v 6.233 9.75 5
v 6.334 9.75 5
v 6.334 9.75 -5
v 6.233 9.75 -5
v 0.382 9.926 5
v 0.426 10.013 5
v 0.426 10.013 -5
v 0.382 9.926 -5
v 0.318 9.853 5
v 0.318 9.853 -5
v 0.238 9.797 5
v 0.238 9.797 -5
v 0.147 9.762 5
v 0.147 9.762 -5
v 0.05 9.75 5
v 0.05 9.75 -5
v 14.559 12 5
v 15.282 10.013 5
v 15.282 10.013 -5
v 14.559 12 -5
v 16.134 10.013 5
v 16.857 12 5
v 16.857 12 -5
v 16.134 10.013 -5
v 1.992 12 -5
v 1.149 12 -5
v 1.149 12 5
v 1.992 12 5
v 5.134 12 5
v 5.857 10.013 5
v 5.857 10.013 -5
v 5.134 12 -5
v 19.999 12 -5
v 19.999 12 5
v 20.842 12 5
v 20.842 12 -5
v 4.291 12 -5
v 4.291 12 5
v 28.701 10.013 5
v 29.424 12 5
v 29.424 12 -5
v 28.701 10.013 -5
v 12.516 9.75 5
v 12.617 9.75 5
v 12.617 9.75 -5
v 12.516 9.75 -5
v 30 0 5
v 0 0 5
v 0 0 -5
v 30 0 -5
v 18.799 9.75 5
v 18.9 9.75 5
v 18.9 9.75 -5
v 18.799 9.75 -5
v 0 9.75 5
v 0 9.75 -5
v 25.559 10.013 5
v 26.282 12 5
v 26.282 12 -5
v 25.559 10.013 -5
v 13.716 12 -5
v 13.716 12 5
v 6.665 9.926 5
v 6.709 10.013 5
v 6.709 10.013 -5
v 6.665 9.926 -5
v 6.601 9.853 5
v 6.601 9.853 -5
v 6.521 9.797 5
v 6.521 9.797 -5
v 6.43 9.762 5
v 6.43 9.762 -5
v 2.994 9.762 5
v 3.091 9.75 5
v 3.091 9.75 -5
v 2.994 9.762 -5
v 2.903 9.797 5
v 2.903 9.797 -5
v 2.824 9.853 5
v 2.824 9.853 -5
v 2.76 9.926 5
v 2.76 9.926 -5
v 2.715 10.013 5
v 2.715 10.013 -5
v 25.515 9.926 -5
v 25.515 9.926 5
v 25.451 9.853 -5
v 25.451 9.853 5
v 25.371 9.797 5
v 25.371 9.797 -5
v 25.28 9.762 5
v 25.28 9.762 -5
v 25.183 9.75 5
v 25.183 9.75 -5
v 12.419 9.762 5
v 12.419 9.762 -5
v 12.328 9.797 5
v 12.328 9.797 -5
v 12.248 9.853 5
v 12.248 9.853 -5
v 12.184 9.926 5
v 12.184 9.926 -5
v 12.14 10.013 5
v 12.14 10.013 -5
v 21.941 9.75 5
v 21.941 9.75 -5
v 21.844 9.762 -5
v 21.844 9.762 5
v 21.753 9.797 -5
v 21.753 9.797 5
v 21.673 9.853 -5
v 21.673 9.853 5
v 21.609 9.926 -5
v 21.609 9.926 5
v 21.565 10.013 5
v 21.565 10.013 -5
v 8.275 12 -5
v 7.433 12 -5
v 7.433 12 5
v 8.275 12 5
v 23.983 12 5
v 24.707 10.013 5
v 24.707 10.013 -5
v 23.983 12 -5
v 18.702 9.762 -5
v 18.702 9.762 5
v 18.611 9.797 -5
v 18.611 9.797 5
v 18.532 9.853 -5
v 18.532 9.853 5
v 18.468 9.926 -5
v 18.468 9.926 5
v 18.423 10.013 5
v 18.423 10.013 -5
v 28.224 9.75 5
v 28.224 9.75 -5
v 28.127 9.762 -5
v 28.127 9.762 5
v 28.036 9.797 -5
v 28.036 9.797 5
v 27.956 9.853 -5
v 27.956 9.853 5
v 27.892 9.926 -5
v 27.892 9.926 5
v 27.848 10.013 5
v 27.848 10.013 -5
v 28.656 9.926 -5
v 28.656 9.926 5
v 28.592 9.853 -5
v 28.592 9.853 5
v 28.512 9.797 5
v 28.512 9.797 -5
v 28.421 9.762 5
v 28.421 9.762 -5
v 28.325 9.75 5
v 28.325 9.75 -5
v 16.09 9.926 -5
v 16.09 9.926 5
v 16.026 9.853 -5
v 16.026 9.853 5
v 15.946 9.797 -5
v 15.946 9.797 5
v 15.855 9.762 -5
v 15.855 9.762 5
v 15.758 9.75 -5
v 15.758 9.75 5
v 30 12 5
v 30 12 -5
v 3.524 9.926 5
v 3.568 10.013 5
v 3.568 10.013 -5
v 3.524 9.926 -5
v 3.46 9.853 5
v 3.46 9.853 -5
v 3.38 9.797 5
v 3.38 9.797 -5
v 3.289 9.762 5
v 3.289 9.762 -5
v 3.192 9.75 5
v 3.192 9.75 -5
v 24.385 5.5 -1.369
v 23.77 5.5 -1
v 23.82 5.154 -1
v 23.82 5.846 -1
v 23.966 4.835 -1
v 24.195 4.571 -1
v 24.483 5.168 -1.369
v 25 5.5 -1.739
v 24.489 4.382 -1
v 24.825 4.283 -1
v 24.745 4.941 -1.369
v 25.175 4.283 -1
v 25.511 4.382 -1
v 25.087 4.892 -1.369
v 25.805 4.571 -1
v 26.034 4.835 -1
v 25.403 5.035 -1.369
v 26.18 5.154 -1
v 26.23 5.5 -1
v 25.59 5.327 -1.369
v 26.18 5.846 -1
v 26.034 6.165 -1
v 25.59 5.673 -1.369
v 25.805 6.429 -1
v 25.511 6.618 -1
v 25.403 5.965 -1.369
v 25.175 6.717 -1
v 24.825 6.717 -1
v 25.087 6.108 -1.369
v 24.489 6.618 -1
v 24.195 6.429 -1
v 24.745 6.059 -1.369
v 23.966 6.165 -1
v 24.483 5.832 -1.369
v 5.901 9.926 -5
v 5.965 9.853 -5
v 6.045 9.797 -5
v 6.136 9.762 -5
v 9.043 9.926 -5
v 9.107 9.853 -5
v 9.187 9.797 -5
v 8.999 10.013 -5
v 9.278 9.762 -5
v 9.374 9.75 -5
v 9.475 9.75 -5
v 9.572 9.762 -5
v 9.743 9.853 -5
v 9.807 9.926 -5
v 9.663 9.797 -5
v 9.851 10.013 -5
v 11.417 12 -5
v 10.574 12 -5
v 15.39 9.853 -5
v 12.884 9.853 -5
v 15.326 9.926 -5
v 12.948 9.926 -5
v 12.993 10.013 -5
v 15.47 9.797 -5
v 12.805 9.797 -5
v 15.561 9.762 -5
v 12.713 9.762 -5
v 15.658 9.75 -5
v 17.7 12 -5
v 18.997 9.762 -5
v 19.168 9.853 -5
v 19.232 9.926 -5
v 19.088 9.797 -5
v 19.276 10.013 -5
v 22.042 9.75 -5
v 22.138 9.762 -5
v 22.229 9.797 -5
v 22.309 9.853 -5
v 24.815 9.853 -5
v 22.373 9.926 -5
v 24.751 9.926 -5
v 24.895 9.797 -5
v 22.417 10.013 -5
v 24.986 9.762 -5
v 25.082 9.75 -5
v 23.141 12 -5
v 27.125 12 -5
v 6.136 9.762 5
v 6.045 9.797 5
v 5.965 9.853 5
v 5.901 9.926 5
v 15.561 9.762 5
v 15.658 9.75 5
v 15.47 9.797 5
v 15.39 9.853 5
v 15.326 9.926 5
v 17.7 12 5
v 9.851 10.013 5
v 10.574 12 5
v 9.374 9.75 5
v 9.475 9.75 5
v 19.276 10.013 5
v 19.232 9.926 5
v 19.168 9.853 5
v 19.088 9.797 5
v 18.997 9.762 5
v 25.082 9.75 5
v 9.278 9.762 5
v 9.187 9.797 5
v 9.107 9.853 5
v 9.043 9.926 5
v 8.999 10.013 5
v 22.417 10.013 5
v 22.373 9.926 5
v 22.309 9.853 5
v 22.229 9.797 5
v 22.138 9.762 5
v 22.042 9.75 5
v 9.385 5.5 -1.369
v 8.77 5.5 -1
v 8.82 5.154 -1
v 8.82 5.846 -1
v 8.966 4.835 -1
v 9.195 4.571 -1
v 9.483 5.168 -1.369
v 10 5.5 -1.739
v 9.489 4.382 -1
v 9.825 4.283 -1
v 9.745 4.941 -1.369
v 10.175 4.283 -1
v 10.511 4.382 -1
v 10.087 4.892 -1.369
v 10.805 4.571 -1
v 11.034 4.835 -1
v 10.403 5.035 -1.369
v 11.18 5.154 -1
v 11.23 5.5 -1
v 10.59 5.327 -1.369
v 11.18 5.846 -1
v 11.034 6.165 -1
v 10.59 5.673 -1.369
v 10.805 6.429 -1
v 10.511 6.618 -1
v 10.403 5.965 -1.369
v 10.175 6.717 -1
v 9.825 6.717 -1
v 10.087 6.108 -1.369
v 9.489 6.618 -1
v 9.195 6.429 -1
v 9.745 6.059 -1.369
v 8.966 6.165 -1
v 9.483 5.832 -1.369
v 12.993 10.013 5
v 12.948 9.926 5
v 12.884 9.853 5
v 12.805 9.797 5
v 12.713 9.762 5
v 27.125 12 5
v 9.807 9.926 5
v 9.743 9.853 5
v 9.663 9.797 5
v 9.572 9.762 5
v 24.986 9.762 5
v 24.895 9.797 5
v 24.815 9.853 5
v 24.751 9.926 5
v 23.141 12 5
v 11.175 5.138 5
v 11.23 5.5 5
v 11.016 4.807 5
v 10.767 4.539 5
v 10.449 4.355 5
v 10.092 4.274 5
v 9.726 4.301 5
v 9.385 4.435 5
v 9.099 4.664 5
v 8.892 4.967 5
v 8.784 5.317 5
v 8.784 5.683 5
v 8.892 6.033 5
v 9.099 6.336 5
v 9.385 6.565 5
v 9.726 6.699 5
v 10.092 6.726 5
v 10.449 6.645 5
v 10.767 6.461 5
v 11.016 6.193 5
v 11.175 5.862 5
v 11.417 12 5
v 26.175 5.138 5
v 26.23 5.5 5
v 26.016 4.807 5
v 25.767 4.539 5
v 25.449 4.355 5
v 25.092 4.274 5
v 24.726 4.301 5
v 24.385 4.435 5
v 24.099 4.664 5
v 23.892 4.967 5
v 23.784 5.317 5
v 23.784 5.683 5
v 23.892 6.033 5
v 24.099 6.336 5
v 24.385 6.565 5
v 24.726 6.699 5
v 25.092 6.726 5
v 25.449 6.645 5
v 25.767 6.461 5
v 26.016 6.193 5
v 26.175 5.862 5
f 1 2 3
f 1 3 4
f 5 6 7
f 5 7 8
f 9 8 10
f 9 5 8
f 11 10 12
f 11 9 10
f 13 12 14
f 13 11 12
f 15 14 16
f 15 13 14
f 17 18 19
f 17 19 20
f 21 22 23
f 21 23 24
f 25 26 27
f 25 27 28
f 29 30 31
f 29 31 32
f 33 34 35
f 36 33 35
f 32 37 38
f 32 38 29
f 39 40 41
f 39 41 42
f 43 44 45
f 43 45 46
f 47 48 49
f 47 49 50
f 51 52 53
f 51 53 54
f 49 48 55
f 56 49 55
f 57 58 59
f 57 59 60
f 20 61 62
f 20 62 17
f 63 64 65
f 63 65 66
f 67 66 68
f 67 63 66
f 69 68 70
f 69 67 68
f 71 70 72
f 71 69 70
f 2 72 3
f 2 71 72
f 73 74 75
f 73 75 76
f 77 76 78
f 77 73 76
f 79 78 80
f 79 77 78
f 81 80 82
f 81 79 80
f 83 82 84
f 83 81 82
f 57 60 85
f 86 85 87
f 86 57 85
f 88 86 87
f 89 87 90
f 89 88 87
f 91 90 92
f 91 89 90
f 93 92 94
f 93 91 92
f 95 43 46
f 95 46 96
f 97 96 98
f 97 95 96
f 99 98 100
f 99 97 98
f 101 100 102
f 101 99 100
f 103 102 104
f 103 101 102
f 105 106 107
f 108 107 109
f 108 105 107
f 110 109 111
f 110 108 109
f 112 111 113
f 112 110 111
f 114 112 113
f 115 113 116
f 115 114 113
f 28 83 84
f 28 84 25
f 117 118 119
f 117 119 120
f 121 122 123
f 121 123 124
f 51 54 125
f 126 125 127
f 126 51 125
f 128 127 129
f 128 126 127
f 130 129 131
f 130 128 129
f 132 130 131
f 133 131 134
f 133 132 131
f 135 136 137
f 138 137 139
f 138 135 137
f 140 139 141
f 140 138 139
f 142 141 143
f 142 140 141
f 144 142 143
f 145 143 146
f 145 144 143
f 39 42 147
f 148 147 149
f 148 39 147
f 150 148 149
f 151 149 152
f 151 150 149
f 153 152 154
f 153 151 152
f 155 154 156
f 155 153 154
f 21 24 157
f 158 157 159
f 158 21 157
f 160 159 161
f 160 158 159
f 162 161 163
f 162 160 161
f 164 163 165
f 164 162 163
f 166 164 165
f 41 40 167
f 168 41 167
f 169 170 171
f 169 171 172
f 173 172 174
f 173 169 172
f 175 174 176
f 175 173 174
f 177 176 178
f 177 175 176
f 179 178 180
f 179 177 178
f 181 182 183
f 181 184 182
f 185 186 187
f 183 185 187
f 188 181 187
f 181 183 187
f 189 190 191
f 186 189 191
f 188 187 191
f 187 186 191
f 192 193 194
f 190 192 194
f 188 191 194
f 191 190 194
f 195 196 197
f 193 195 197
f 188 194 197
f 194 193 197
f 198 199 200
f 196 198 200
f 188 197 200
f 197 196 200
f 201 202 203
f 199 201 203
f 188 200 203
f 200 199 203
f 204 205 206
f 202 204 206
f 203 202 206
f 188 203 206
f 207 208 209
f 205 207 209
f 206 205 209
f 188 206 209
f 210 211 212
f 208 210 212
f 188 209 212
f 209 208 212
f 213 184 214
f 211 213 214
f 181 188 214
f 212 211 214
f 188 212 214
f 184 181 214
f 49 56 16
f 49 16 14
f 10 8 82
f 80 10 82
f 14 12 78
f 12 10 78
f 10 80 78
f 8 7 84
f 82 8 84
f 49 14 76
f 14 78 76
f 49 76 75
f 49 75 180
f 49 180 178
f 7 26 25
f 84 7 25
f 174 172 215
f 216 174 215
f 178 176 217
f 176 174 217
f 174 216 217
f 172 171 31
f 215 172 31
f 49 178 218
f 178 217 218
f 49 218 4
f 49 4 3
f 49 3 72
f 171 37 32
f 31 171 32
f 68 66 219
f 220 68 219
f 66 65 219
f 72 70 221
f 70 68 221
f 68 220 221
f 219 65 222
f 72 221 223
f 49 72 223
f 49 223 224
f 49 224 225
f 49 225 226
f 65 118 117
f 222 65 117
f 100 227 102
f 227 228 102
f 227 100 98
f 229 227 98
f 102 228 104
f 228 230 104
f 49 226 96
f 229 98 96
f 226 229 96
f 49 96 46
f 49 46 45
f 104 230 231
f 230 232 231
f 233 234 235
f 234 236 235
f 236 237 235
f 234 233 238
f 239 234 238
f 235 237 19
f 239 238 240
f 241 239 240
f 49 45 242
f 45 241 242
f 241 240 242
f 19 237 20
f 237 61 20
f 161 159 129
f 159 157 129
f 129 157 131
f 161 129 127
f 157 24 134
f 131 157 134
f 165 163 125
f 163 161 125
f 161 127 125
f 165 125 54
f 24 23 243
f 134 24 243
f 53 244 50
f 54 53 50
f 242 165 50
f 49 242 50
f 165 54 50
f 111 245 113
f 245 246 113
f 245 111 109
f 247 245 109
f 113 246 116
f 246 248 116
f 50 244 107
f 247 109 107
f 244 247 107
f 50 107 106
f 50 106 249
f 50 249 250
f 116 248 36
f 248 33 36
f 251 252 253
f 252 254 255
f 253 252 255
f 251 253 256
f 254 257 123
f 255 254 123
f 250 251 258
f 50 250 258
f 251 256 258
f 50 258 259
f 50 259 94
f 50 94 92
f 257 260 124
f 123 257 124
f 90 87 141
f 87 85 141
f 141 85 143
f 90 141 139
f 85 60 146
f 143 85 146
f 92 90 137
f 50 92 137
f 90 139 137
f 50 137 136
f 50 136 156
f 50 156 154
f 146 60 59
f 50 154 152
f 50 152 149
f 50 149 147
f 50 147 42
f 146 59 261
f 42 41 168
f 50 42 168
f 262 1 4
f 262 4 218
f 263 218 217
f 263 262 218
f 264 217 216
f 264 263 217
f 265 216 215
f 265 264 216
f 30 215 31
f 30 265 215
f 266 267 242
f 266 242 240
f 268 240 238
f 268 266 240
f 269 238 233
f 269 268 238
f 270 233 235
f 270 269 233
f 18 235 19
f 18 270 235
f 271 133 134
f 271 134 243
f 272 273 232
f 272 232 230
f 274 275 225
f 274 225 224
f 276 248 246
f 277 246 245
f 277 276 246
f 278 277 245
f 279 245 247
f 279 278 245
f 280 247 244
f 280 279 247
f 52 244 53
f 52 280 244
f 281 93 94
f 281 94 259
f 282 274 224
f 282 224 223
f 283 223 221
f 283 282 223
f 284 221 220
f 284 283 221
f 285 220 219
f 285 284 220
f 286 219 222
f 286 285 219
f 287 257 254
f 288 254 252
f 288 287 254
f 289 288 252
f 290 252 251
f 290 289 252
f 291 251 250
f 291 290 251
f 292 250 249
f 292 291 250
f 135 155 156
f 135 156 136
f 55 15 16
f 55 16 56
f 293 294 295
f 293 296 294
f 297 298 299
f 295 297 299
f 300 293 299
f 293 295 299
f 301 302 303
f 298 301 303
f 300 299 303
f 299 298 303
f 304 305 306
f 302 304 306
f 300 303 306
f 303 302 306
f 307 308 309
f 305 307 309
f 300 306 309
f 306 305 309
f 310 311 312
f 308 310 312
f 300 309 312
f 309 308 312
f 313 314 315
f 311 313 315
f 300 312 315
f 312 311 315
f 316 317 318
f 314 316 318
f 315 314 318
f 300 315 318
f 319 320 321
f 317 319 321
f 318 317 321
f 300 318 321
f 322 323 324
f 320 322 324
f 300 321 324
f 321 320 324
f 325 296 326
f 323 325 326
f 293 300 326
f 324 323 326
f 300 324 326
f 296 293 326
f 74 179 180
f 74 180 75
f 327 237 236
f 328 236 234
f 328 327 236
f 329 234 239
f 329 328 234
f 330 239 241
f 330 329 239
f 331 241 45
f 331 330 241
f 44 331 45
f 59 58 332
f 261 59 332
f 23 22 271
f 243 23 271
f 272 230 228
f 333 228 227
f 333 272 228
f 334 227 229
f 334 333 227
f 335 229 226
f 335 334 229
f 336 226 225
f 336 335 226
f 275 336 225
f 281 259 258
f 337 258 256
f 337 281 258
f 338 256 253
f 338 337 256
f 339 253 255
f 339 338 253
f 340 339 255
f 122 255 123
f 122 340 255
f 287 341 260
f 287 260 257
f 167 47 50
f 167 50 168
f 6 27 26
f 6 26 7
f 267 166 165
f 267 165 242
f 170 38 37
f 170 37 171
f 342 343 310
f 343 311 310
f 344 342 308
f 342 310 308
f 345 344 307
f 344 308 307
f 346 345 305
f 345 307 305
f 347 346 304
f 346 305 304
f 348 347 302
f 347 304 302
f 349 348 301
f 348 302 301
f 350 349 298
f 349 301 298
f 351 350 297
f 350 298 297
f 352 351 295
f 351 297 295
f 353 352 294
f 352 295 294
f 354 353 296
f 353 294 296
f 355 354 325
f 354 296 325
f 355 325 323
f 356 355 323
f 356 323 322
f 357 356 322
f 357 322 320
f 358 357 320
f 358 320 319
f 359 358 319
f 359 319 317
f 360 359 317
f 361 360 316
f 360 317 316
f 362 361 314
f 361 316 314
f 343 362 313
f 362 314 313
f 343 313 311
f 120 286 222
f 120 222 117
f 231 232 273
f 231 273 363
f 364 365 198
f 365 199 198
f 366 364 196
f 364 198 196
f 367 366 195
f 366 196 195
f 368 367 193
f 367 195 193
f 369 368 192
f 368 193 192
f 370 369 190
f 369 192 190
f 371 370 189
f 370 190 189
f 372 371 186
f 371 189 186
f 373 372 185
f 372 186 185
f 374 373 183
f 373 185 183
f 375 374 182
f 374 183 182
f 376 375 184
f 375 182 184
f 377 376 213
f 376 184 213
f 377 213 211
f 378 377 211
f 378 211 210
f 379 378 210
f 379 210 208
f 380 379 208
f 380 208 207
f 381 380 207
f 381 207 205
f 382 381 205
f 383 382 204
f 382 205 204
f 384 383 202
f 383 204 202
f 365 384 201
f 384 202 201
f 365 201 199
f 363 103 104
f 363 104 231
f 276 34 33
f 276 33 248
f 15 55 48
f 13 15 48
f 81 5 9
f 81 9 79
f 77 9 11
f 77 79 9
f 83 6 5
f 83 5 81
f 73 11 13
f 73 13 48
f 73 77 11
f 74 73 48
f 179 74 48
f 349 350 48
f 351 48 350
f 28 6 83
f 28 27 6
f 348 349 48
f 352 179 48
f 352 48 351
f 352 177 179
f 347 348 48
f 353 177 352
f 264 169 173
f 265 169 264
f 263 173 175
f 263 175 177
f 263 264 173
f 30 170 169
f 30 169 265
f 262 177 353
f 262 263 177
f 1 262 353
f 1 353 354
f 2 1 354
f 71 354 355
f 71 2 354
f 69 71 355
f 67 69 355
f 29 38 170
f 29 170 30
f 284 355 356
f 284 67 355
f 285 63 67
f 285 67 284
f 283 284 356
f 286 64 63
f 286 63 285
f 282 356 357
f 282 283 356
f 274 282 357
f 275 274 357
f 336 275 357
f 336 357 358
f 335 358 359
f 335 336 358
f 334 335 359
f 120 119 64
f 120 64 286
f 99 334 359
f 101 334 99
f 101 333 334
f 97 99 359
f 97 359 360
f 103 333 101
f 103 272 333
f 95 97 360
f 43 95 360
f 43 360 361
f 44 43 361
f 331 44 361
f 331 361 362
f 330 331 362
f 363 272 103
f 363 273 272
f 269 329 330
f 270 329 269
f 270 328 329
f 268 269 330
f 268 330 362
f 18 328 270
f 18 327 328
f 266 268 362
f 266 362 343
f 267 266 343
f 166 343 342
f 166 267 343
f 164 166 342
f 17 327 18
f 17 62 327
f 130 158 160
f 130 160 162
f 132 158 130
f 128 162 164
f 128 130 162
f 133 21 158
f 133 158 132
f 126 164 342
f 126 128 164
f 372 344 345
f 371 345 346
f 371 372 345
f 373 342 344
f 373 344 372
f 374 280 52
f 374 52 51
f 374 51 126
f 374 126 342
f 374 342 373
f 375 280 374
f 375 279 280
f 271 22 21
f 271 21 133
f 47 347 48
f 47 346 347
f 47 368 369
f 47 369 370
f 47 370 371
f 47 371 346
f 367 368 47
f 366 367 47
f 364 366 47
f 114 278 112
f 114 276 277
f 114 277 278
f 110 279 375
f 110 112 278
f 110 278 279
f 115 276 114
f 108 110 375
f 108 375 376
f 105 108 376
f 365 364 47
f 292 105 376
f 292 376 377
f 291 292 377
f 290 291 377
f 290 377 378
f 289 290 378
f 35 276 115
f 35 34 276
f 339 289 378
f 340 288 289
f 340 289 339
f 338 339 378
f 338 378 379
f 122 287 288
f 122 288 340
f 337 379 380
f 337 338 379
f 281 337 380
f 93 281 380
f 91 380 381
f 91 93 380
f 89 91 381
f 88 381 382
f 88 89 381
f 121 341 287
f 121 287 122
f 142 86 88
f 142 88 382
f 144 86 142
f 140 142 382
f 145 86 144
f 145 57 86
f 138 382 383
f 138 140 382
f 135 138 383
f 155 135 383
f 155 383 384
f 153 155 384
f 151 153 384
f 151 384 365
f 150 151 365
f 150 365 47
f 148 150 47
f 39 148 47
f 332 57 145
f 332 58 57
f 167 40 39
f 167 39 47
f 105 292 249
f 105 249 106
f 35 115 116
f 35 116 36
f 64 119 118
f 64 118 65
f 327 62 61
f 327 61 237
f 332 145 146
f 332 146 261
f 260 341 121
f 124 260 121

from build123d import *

# Parameters (mm, degrees)
SKETCH1_W           = 30
SKETCH1_H           = 12
BOSS_EXTRUDE1_DEPTH = 5
CUT_EXTRUDE1_DEPTH  = 34.823069051
LPATTERN1_COUNT     = 10
LPATTERN1_PITCH     = 3.141592654
TAP1_D              = 2.459
TAP1_DEPTH          = 6
TAP1_TIP            = 0.738758131
TAP3_D              = 2.459
TAP3_DEPTH          = 6
TAP3_TIP            = 0.738758131


with BuildPart() as part:
    # Sketch1 → Boss-Extrude1 (new, symmetric)
    with BuildSketch(Plane.XY):
        with Locations((15, 6)):
            Rectangle(SKETCH1_W, SKETCH1_H)
    extrude(amount=BOSS_EXTRUDE1_DEPTH, both=True)

    # Sketch2 → Cut-Extrude1 (cut, through all)
    with BuildSketch(Plane.XY.offset(5)):
        with BuildLine():
            Line((-1.149368398, 12), (1.149368398, 12))
            Line((1.149368398, 12), (0.426229404, 10.013191943))
            ThreePointArc((0.426229404, 10.013191943), (0.27978293, 9.822339182), (0.050352355, 9.75))
            Line((0.050352355, 9.75), (-0.050352355, 9.75))
            ThreePointArc((-0.050352355, 9.75), (-0.27978293, 9.822339182), (-0.426229404, 10.013191943))
            Line((-0.426229404, 10.013191943), (-1.149368398, 12))
        make_face()
    cut_extrude1 = extrude(amount=-CUT_EXTRUDE1_DEPTH, mode=Mode.SUBTRACT)

    # LPattern1: Cut-Extrude1 ×10
    with Locations(*[(i * LPATTERN1_PITCH, 0, 0) for i in range(1, LPATTERN1_COUNT)]):
        add(cut_extrude1, mode=Mode.SUBTRACT)

    # Tap1
    with Locations(Plane(origin=(-45.41658703, 4.630780207, 5), x_dir=(-1, 0, 0), z_dir=(0, 0, 1))):
        with Locations((-55.41658703, -0.869219793)):
            Hole(TAP1_D / 2, depth=TAP1_DEPTH)
            with Locations((0, 0, -(TAP1_DEPTH + TAP1_TIP / 2))):  # 118° drill point
                Cone(0, TAP1_D / 2, TAP1_TIP, mode=Mode.SUBTRACT)

    # Tap3
    with Locations(Plane(origin=(-24.792169361, 5.708678804, 5), x_dir=(-1, 0, 0), z_dir=(0, 0, 1))):
        with Locations((-49.792169361, 0.208678804)):
            Hole(TAP3_D / 2, depth=TAP3_DEPTH)
            with Locations((0, 0, -(TAP3_DEPTH + TAP3_TIP / 2))):  # 118° drill point
                Cone(0, TAP3_D / 2, TAP3_TIP, mode=Mode.SUBTRACT)


solid = part.part
